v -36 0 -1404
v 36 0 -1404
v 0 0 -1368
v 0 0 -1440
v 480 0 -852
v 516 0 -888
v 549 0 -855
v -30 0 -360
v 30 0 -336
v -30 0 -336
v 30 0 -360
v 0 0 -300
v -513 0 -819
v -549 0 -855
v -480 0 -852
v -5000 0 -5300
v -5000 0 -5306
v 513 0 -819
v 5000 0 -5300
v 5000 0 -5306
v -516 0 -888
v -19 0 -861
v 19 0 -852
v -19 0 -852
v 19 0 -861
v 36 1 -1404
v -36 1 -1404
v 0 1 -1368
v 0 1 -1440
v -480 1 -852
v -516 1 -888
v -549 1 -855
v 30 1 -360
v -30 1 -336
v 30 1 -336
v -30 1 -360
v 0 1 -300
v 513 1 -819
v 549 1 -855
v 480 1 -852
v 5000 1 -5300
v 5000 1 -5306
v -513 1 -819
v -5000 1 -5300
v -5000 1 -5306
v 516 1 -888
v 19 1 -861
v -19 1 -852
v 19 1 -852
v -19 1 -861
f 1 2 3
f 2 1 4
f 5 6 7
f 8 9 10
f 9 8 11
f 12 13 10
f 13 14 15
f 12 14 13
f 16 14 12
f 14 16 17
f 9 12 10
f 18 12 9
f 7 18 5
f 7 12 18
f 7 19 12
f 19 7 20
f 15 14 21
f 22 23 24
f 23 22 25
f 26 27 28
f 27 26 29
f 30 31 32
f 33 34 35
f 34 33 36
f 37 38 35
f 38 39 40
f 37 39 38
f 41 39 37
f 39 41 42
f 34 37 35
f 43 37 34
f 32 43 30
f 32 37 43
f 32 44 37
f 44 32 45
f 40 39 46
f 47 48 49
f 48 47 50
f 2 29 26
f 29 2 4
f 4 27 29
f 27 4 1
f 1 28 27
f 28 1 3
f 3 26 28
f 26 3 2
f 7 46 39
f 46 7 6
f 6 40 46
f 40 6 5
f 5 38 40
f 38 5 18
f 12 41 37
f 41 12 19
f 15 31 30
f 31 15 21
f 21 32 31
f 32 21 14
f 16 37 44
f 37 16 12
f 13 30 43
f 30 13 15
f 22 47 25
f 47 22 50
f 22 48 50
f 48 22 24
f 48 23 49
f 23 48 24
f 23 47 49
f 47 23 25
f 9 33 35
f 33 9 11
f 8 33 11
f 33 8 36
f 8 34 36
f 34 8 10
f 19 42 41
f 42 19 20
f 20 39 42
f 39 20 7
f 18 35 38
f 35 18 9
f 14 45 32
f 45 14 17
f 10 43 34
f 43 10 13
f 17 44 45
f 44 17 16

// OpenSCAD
$fs = 120;

$vpt = [0,1080,480];
$vpr = [-34,0,0];
$vpf = 45;

foul_line = 6;
plain_color = [1,1,1,0.8];
out_color = [1,0.75,0.75,0.8];
eat_color = [0.5,0.75,1,0.8];

// home, first, second, third, rubber
color([1,1,1]) scale([1,-1,-1]) rotate([90,0,0]) linear_extrude(1) {
    polygon([[-30,30*2+300],[30,30*2+300],[30,30+300],[0,300],[-30,30+300]]);
    polygon([[552-36*2,852],[552-36,852+36],[552,852],[552-36,852-36]]);
    polygon([[0,1404+36],[36,1404],[0,1404-36],[-36,1404]]);
    polygon([[-552+36*2,852],[-552+36,852+36],[-552,852],[-552+36,852-36]]);
    polygon([[-19,852],[19,852],[19,9+852],[-19,9+852]]);
}

// foul lines
color([1,1,1,0.5]) scale([1,-1,-1]) rotate([90,0,0]) linear_extrude(1) {
    polygon([[0,300],[-5000,300+5000],[-5000,300+5000+foul_line],[0,300+foul_line]]);
    polygon([[0,300],[5000,300+5000],[5000,300+5000+foul_line],[0,300+foul_line]]);
}

scale([0.1,0.1,-0.1]) translate([-23200,0,0]) {
    color(out_color) polyhedron([[12420,0,13940],[12430,0,13940],[12420,1200,13940],[12430,1200,13940]], [[0,1,3,2]]);
    color(out_color) polyhedron([[12420,0,13940],[12380,0,21720],[12420,1200,13940],[12380,1200,21720]], [[0,1,3,2]]);
    color(out_color) polyhedron([[12430,0,13940],[12390,0,21720],[12430,1200,13940],[12390,1200,21720]], [[0,1,3,2]]);
    color(out_color) polyhedron([[12380,0,21720],[12390,0,21720],[12380,1200,21720],[12390,1200,21720]], [[0,1,3,2]]);
    color(out_color) polyhedron([[12420,1200,13940],[12380,1200,21720],[12430,1200,13940],[12390,1200,21720]], [[0,1,3,2]]);
    color(out_color) polyhedron([[12380,0,21720],[17180,0,26340],[12380,1200,21720],[17180,1200,26340]], [[0,1,3,2]]);
    color(out_color) polyhedron([[12380,0,21720],[12380,0,21820],[12380,1200,21720],[12380,1200,21820]], [[0,1,3,2]]);
    color(out_color) polyhedron([[17180,0,26340],[17180,0,26440],[17180,1200,26340],[17180,1200,26440]], [[0,1,3,2]]);
    color(out_color) polyhedron([[12380,0,21820],[17180,0,26440],[12380,1200,21820],[17180,1200,26440]], [[0,1,3,2]]);
    color(out_color) polyhedron([[12380,1200,21720],[12380,1200,21820],[17180,1200,26340],[17180,1200,26440]], [[0,1,3,2]]);
    color(out_color) polyhedron([[17180,0,26340],[20150,0,26340],[17180,1200,26340],[20150,1200,26340]], [[0,1,3,2]]);
    color(out_color) polyhedron([[17180,0,26340],[17180,0,26440],[17180,1200,26340],[17180,1200,26440]], [[0,1,3,2]]);
    color(out_color) polyhedron([[20150,0,26340],[20150,0,26440],[20150,1200,26340],[20150,1200,26440]], [[0,1,3,2]]);
    color(out_color) polyhedron([[17180,0,26440],[20150,0,26440],[17180,1200,26440],[20150,1200,26440]], [[0,1,3,2]]);
    color(out_color) polyhedron([[17180,1200,26340],[17180,1200,26440],[20150,1200,26340],[20150,1200,26440]], [[0,1,3,2]]);
    color(plain_color) polyhedron([[20150,0,26340],[26250,0,26340],[20150,1200,26340],[26250,1200,26340]], [[0,1,3,2]]);
    color(plain_color) polyhedron([[20150,0,26340],[20150,0,26440],[20150,1200,26340],[20150,1250,26440]], [[0,1,3,2]]);
    color(plain_color) polyhedron([[26250,0,26340],[26250,0,26440],[26250,1200,26340],[26250,1250,26440]], [[0,1,3,2]]);
    color(plain_color) polyhedron([[20150,0,26440],[26250,0,26440],[20150,1250,26440],[26250,1250,26440]], [[0,1,3,2]]);
    color(plain_color) polyhedron([[20150,1200,26340],[20150,1250,26440],[26250,1200,26340],[26250,1250,26440]], [[0,1,3,2]]);
    color(out_color) polyhedron([[26250,0,26340],[29220,0,26340],[26250,1200,26340],[29220,1200,26340]], [[0,1,3,2]]);
    color(out_color) polyhedron([[26250,0,26340],[26250,0,26440],[26250,1200,26340],[26250,1200,26440]], [[0,1,3,2]]);
    color(out_color) polyhedron([[29220,0,26340],[29220,0,26440],[29220,1200,26340],[29220,1200,26440]], [[0,1,3,2]]);
    color(out_color) polyhedron([[26250,0,26440],[29220,0,26440],[26250,1200,26440],[29220,1200,26440]], [[0,1,3,2]]);
    color(out_color) polyhedron([[26250,1200,26340],[26250,1200,26440],[29220,1200,26340],[29220,1200,26440]], [[0,1,3,2]]);
    color(out_color) polyhedron([[29220,0,26340],[34020,0,21720],[29220,1200,26340],[34020,1200,21720]], [[0,1,3,2]]);
    color(out_color) polyhedron([[29220,0,26340],[29220,0,26440],[29220,1200,26340],[29220,1200,26440]], [[0,1,3,2]]);
    color(out_color) polyhedron([[34020,0,21720],[34020,0,21820],[34020,1200,21720],[34020,1200,21820]], [[0,1,3,2]]);
    color(out_color) polyhedron([[29220,0,26440],[34020,0,21820],[29220,1200,26440],[34020,1200,21820]], [[0,1,3,2]]);
    color(out_color) polyhedron([[29220,1200,26340],[29220,1200,26440],[34020,1200,21720],[34020,1200,21820]], [[0,1,3,2]]);
    color(out_color) polyhedron([[33980,0,13900],[33990,0,13900],[33980,1200,13900],[33990,1200,13900]], [[0,1,3,2]]);
    color(out_color) polyhedron([[33980,0,13900],[34020,0,21720],[33980,1200,13900],[34020,1200,21720]], [[0,1,3,2]]);
    color(out_color) polyhedron([[33990,0,13900],[34030,0,21720],[33990,1200,13900],[34030,1200,21720]], [[0,1,3,2]]);
    color(out_color) polyhedron([[34020,0,21720],[34030,0,21720],[34020,1200,21720],[34030,1200,21720]], [[0,1,3,2]]);
    color(out_color) polyhedron([[33980,1200,13900],[34020,1200,21720],[33990,1200,13900],[34030,1200,21720]], [[0,1,3,2]]);
    color(out_color) polyhedron([[20150,0,26360],[26250,0,26360],[20150,3700,26360],[26250,3700,26360]], [[0,1,3,2]]);
    color(out_color) polyhedron([[20150,0,26360],[20150,0,26460],[20150,3700,26360],[20150,3700,26460]], [[0,1,3,2]]);
    color(out_color) polyhedron([[26250,0,26360],[26250,0,26460],[26250,3700,26360],[26250,3700,26460]], [[0,1,3,2]]);
    color(out_color) polyhedron([[20150,0,26460],[26250,0,26460],[20150,3700,26460],[26250,3700,26460]], [[0,1,3,2]]);
    color(out_color) polyhedron([[20150,3700,26360],[20150,3700,26460],[26250,3700,26360],[26250,3700,26460]], [[0,1,3,2]]);
    color(out_color) polyhedron([[2900,0,13940],[12430,0,13940],[2900,5,13940],[12430,5,13940]], [[0,1,3,2]]);
    color(out_color) polyhedron([[2900,0,13940],[2900,0,13950],[2900,5,13940],[2900,5,13950]], [[0,1,3,2]]);
    color(out_color) polyhedron([[12430,0,13940],[12430,0,13950],[12430,5,13940],[12430,5,13950]], [[0,1,3,2]]);
    color(out_color) polyhedron([[2900,0,13950],[12430,0,13950],[2900,5,13950],[12430,5,13950]], [[0,1,3,2]]);
    color(out_color) polyhedron([[2900,5,13940],[2900,5,13950],[12430,5,13940],[12430,5,13950]], [[0,1,3,2]]);
    color(out_color) polyhedron([[34030,0,13900],[40000,0,13900],[34030,5,13900],[40000,5,13900]], [[0,1,3,2]]);
    color(out_color) polyhedron([[34030,0,13900],[34030,0,13910],[34030,5,13900],[34030,5,13910]], [[0,1,3,2]]);
    color(out_color) polyhedron([[40000,0,13900],[40000,0,13910],[40000,5,13900],[40000,5,13910]], [[0,1,3,2]]);
    color(out_color) polyhedron([[34030,0,13910],[40000,0,13910],[34030,5,13910],[40000,5,13910]], [[0,1,3,2]]);
    color(out_color) polyhedron([[34030,5,13900],[34030,5,13910],[40000,5,13900],[40000,5,13910]], [[0,1,3,2]]);
    color(out_color) polyhedron([[13960,0,4590],[18500,0,4590],[13960,5,4590],[18500,5,4590]], [[0,1,3,2]]);
    color(out_color) polyhedron([[13960,0,4590],[13960,0,4690],[13960,5,4590],[13960,5,4690]], [[0,1,3,2]]);
    color(out_color) polyhedron([[18500,0,4590],[18500,0,4690],[18500,5,4590],[18500,5,4690]], [[0,1,3,2]]);
    color(out_color) polyhedron([[13960,0,4690],[18500,0,4690],[13960,5,4690],[18500,5,4690]], [[0,1,3,2]]);
    color(out_color) polyhedron([[13960,5,4590],[13960,5,4690],[18500,5,4590],[18500,5,4690]], [[0,1,3,2]]);
    color(out_color) polyhedron([[19090,0,1880],[19190,0,1880],[19090,5,1880],[19190,5,1880]], [[0,1,3,2]]);
    color(out_color) polyhedron([[19090,0,1880],[18500,0,4560],[19090,5,1880],[18500,5,4560]], [[0,1,3,2]]);
    color(out_color) polyhedron([[19190,0,1880],[18600,0,4560],[19190,5,1880],[18600,5,4560]], [[0,1,3,2]]);
    color(out_color) polyhedron([[18500,0,4560],[18600,0,4560],[18500,5,4560],[18600,5,4560]], [[0,1,3,2]]);
    color(out_color) polyhedron([[19090,5,1880],[18500,5,4560],[19190,5,1880],[18600,5,4560]], [[0,1,3,2]]);
    color(out_color) polyhedron([[2900,0,7210],[14730,0,7120],[2900,5,7210],[14730,5,7120]], [[0,1,3,2]]);
    color(out_color) polyhedron([[2900,0,7210],[2900,0,7220],[2900,5,7210],[2900,5,7220]], [[0,1,3,2]]);
    color(out_color) polyhedron([[14730,0,7120],[14730,0,7130],[14730,5,7120],[14730,5,7130]], [[0,1,3,2]]);
    color(out_color) polyhedron([[2900,0,7220],[14730,0,7130],[2900,5,7220],[14730,5,7130]], [[0,1,3,2]]);
    color(out_color) polyhedron([[2900,5,7210],[2900,5,7220],[14730,5,7120],[14730,5,7130]], [[0,1,3,2]]);
    color(out_color) polyhedron([[14730,0,7120],[16970,0,4490],[14730,5,7120],[16970,5,4490]], [[0,1,3,2]]);
    color(out_color) polyhedron([[14730,0,7120],[14730,0,7130],[14730,5,7120],[14730,5,7130]], [[0,1,3,2]]);
    color(out_color) polyhedron([[16970,0,4490],[16970,0,4500],[16970,5,4490],[16970,5,4500]], [[0,1,3,2]]);
    color(out_color) polyhedron([[14730,0,7130],[16970,0,4500],[14730,5,7130],[16970,5,4500]], [[0,1,3,2]]);
    color(out_color) polyhedron([[14730,5,7120],[14730,5,7130],[16970,5,4490],[16970,5,4500]], [[0,1,3,2]]);
    color(out_color) polyhedron([[26350,0,1910],[40000,0,15560],[26350,5,1910],[40000,5,15560]], [[0,1,3,2]]);
    color(out_color) polyhedron([[26350,0,1910],[26350,0,1920],[26350,5,1910],[26350,5,1920]], [[0,1,3,2]]);
    color(out_color) polyhedron([[40000,0,15560],[40000,0,15570],[40000,5,15560],[40000,5,15570]], [[0,1,3,2]]);
    color(out_color) polyhedron([[26350,0,1920],[40000,0,15570],[26350,5,1920],[40000,5,15570]], [[0,1,3,2]]);
    color(out_color) polyhedron([[26350,5,1910],[26350,5,1920],[40000,5,15560],[40000,5,15570]], [[0,1,3,2]]);
    color(plain_color) polyhedron([[0,0,0],[0,0,0],[0,0,0],[0,0,0]], [[0,1,3,2]]);
    color(plain_color) polyhedron([[0,0,0],[0,0,0],[0,0,0],[0,0,0]], [[0,1,3,2]]);
    color(plain_color) polyhedron([[0,0,0],[0,0,0],[0,0,0],[0,0,0]], [[0,1,3,2]]);
    color(plain_color) polyhedron([[0,0,0],[0,0,0],[0,0,0],[0,0,0]], [[0,1,3,2]]);
    color(plain_color) polyhedron([[0,0,0],[0,0,0],[0,0,0],[0,0,0]], [[0,1,3,2]]);
    color(plain_color) polyhedron([[0,0,0],[0,0,0],[0,0,0],[0,0,0]], [[0,1,3,2]]);
    color(plain_color) polyhedron([[0,0,0],[0,0,0],[0,0,0],[0,0,0]], [[0,1,3,2]]);
    color(plain_color) polyhedron([[0,0,0],[0,0,0],[0,0,0],[0,0,0]], [[0,1,3,2]]);
    color(plain_color) polyhedron([[0,0,0],[0,0,0],[0,0,0],[0,0,0]], [[0,1,3,2]]);
    color(plain_color) polyhedron([[0,0,0],[0,0,0],[0,0,0],[0,0,0]], [[0,1,3,2]]);
    color(plain_color) polyhedron([[0,0,0],[0,0,0],[0,0,0],[0,0,0]], [[0,1,3,2]]);
    color(plain_color) polyhedron([[0,0,0],[0,0,0],[0,0,0],[0,0,0]], [[0,1,3,2]]);
    color(plain_color) polyhedron([[0,0,0],[0,0,0],[0,0,0],[0,0,0]], [[0,1,3,2]]);
    color(plain_color) polyhedron([[0,0,0],[0,0,0],[0,0,0],[0,0,0]], [[0,1,3,2]]);
    color(plain_color) polyhedron([[0,0,0],[0,0,0],[0,0,0],[0,0,0]], [[0,1,3,2]]);
    color(plain_color) polyhedron([[0,0,0],[0,0,0],[0,0,0],[0,0,0]], [[0,1,3,2]]);
    color(plain_color) polyhedron([[0,0,0],[0,0,0],[0,0,0],[0,0,0]], [[0,1,3,2]]);
    color(plain_color) polyhedron([[0,0,0],[0,0,0],[0,0,0],[0,0,0]], [[0,1,3,2]]);
    color(plain_color) polyhedron([[0,0,0],[0,0,0],[0,0,0],[0,0,0]], [[0,1,3,2]]);
    color(plain_color) polyhedron([[0,0,0],[0,0,0],[0,0,0],[0,0,0]], [[0,1,3,2]]);
    color(plain_color) polyhedron([[0,0,0],[0,0,0],[0,0,0],[0,0,0]], [[0,1,3,2]]);
    color(plain_color) polyhedron([[0,0,0],[0,0,0],[0,0,0],[0,0,0]], [[0,1,3,2]]);
    color(plain_color) polyhedron([[0,0,0],[0,0,0],[0,0,0],[0,0,0]], [[0,1,3,2]]);
    color(plain_color) polyhedron([[0,0,0],[0,0,0],[0,0,0],[0,0,0]], [[0,1,3,2]]);
    color(plain_color) polyhedron([[0,0,0],[0,0,0],[0,0,0],[0,0,0]], [[0,1,3,2]]);
    color(plain_color) polyhedron([[0,0,0],[0,0,0],[0,0,0],[0,0,0]], [[0,1,3,2]]);
    color(plain_color) polyhedron([[0,0,0],[0,0,0],[0,0,0],[0,0,0]], [[0,1,3,2]]);
    color(plain_color) polyhedron([[0,0,0],[0,0,0],[0,0,0],[0,0,0]], [[0,1,3,2]]);
    color(plain_color) polyhedron([[0,0,0],[0,0,0],[0,0,0],[0,0,0]], [[0,1,3,2]]);
    color(plain_color) polyhedron([[0,0,0],[0,0,0],[0,0,0],[0,0,0]], [[0,1,3,2]]);
    color(plain_color) polyhedron([[0,0,0],[0,0,0],[0,0,0],[0,0,0]], [[0,1,3,2]]);
    color(plain_color) polyhedron([[0,0,0],[0,0,0],[0,0,0],[0,0,0]], [[0,1,3,2]]);
    color(plain_color) polyhedron([[0,0,0],[0,0,0],[0,0,0],[0,0,0]], [[0,1,3,2]]);
    color(plain_color) polyhedron([[0,0,0],[0,0,0],[0,0,0],[0,0,0]], [[0,1,3,2]]);
    color(plain_color) polyhedron([[0,0,0],[0,0,0],[0,0,0],[0,0,0]], [[0,1,3,2]]);
    color(plain_color) polyhedron([[0,0,0],[0,0,0],[0,0,0],[0,0,0]], [[0,1,3,2]]);
    color(plain_color) polyhedron([[0,0,0],[0,0,0],[0,0,0],[0,0,0]], [[0,1,3,2]]);
    color(plain_color) polyhedron([[0,0,0],[0,0,0],[0,0,0],[0,0,0]], [[0,1,3,2]]);
    color(plain_color) polyhedron([[0,0,0],[0,0,0],[0,0,0],[0,0,0]], [[0,1,3,2]]);
    color(plain_color) polyhedron([[0,0,0],[0,0,0],[0,0,0],[0,0,0]], [[0,1,3,2]]);
    color(plain_color) polyhedron([[0,0,0],[0,0,0],[0,0,0],[0,0,0]], [[0,1,3,2]]);
    color(plain_color) polyhedron([[0,0,0],[0,0,0],[0,0,0],[0,0,0]], [[0,1,3,2]]);
    color(plain_color) polyhedron([[0,0,0],[0,0,0],[0,0,0],[0,0,0]], [[0,1,3,2]]);
    color(plain_color) polyhedron([[0,0,0],[0,0,0],[0,0,0],[0,0,0]], [[0,1,3,2]]);
    color(plain_color) polyhedron([[0,0,0],[0,0,0],[0,0,0],[0,0,0]], [[0,1,3,2]]);
    color(plain_color) polyhedron([[0,0,0],[0,0,0],[0,0,0],[0,0,0]], [[0,1,3,2]]);
    color(plain_color) polyhedron([[0,0,0],[0,0,0],[0,0,0],[0,0,0]], [[0,1,3,2]]);
    color(plain_color) polyhedron([[0,0,0],[0,0,0],[0,0,0],[0,0,0]], [[0,1,3,2]]);
    color(plain_color) polyhedron([[0,0,0],[0,0,0],[0,0,0],[0,0,0]], [[0,1,3,2]]);
    color(plain_color) polyhedron([[0,0,0],[0,0,0],[0,0,0],[0,0,0]], [[0,1,3,2]]);
    color(plain_color) polyhedron([[0,0,0],[0,0,0],[0,0,0],[0,0,0]], [[0,1,3,2]]);
    color(plain_color) polyhedron([[0,0,0],[0,0,0],[0,0,0],[0,0,0]], [[0,1,3,2]]);
    color(plain_color) polyhedron([[0,0,0],[0,0,0],[0,0,0],[0,0,0]], [[0,1,3,2]]);
    color(plain_color) polyhedron([[0,0,0],[0,0,0],[0,0,0],[0,0,0]], [[0,1,3,2]]);
    color(plain_color) polyhedron([[0,0,0],[0,0,0],[0,0,0],[0,0,0]], [[0,1,3,2]]);
    color(plain_color) polyhedron([[0,0,0],[0,0,0],[0,0,0],[0,0,0]], [[0,1,3,2]]);
    color(plain_color) polyhedron([[0,0,0],[0,0,0],[0,0,0],[0,0,0]], [[0,1,3,2]]);
    color(plain_color) polyhedron([[0,0,0],[0,0,0],[0,0,0],[0,0,0]], [[0,1,3,2]]);
    color(plain_color) polyhedron([[0,0,0],[0,0,0],[0,0,0],[0,0,0]], [[0,1,3,2]]);
    color(plain_color) polyhedron([[0,0,0],[0,0,0],[0,0,0],[0,0,0]], [[0,1,3,2]]);
    color(plain_color) polyhedron([[0,0,0],[0,0,0],[0,0,0],[0,0,0]], [[0,1,3,2]]);
    color(plain_color) polyhedron([[0,0,0],[0,0,0],[0,0,0],[0,0,0]], [[0,1,3,2]]);
    color(plain_color) polyhedron([[0,0,0],[0,0,0],[0,0,0],[0,0,0]], [[0,1,3,2]]);
    color(plain_color) polyhedron([[0,0,0],[0,0,0],[0,0,0],[0,0,0]], [[0,1,3,2]]);
    color(plain_color) polyhedron([[0,0,0],[0,0,0],[0,0,0],[0,0,0]], [[0,1,3,2]]);
    color(plain_color) polyhedron([[0,0,0],[0,0,0],[0,0,0],[0,0,0]], [[0,1,3,2]]);
    color(plain_color) polyhedron([[0,0,0],[0,0,0],[0,0,0],[0,0,0]], [[0,1,3,2]]);
    color(plain_color) polyhedron([[0,0,0],[0,0,0],[0,0,0],[0,0,0]], [[0,1,3,2]]);
    color(plain_color) polyhedron([[0,0,0],[0,0,0],[0,0,0],[0,0,0]], [[0,1,3,2]]);
    color(plain_color) polyhedron([[0,0,0],[0,0,0],[0,0,0],[0,0,0]], [[0,1,3,2]]);
    color(plain_color) polyhedron([[0,0,0],[0,0,0],[0,0,0],[0,0,0]], [[0,1,3,2]]);
    color(plain_color) polyhedron([[0,0,0],[0,0,0],[0,0,0],[0,0,0]], [[0,1,3,2]]);
    color(plain_color) polyhedron([[0,0,0],[0,0,0],[0,0,0],[0,0,0]], [[0,1,3,2]]);
    color(plain_color) polyhedron([[0,0,0],[0,0,0],[0,0,0],[0,0,0]], [[0,1,3,2]]);
    color(plain_color) polyhedron([[0,0,0],[0,0,0],[0,0,0],[0,0,0]], [[0,1,3,2]]);
    color(plain_color) polyhedron([[0,0,0],[0,0,0],[0,0,0],[0,0,0]], [[0,1,3,2]]);
    color(plain_color) polyhedron([[0,0,0],[0,0,0],[0,0,0],[0,0,0]], [[0,1,3,2]]);
    color(plain_color) polyhedron([[0,0,0],[0,0,0],[0,0,0],[0,0,0]], [[0,1,3,2]]);
    color(plain_color) polyhedron([[0,0,0],[0,0,0],[0,0,0],[0,0,0]], [[0,1,3,2]]);
    color(plain_color) polyhedron([[0,0,0],[0,0,0],[0,0,0],[0,0,0]], [[0,1,3,2]]);
    color(plain_color) polyhedron([[0,0,0],[0,0,0],[0,0,0],[0,0,0]], [[0,1,3,2]]);
    color(plain_color) polyhedron([[0,0,0],[0,0,0],[0,0,0],[0,0,0]], [[0,1,3,2]]);
    color(plain_color) polyhedron([[0,0,0],[0,0,0],[0,0,0],[0,0,0]], [[0,1,3,2]]);
    color(plain_color) polyhedron([[0,0,0],[0,0,0],[0,0,0],[0,0,0]], [[0,1,3,2]]);
    color(plain_color) polyhedron([[0,0,0],[0,0,0],[0,0,0],[0,0,0]], [[0,1,3,2]]);
    color(plain_color) polyhedron([[0,0,0],[0,0,0],[0,0,0],[0,0,0]], [[0,1,3,2]]);
    color(plain_color) polyhedron([[0,0,0],[0,0,0],[0,0,0],[0,0,0]], [[0,1,3,2]]);
    color(plain_color) polyhedron([[0,0,0],[0,0,0],[0,0,0],[0,0,0]], [[0,1,3,2]]);
    color(plain_color) polyhedron([[0,0,0],[0,0,0],[0,0,0],[0,0,0]], [[0,1,3,2]]);
    color(plain_color) polyhedron([[0,0,0],[0,0,0],[0,0,0],[0,0,0]], [[0,1,3,2]]);
    color(plain_color) polyhedron([[0,0,0],[0,0,0],[0,0,0],[0,0,0]], [[0,1,3,2]]);
    color(plain_color) polyhedron([[0,0,0],[0,0,0],[0,0,0],[0,0,0]], [[0,1,3,2]]);
    color(plain_color) polyhedron([[0,0,0],[0,0,0],[0,0,0],[0,0,0]], [[0,1,3,2]]);
    color(plain_color) polyhedron([[0,0,0],[0,0,0],[0,0,0],[0,0,0]], [[0,1,3,2]]);
    color(plain_color) polyhedron([[0,0,0],[0,0,0],[0,0,0],[0,0,0]], [[0,1,3,2]]);
    color(plain_color) polyhedron([[0,0,0],[0,0,0],[0,0,0],[0,0,0]], [[0,1,3,2]]);
    color(plain_color) polyhedron([[0,0,0],[0,0,0],[0,0,0],[0,0,0]], [[0,1,3,2]]);
    color(plain_color) polyhedron([[0,0,0],[0,0,0],[0,0,0],[0,0,0]], [[0,1,3,2]]);
    color(plain_color) polyhedron([[0,0,0],[0,0,0],[0,0,0],[0,0,0]], [[0,1,3,2]]);
    color(plain_color) polyhedron([[0,0,0],[0,0,0],[0,0,0],[0,0,0]], [[0,1,3,2]]);
    color(plain_color) polyhedron([[0,0,0],[0,0,0],[0,0,0],[0,0,0]], [[0,1,3,2]]);
    color(plain_color) polyhedron([[0,0,0],[0,0,0],[0,0,0],[0,0,0]], [[0,1,3,2]]);
    color(plain_color) polyhedron([[0,0,0],[0,0,0],[0,0,0],[0,0,0]], [[0,1,3,2]]);
    color(plain_color) polyhedron([[0,0,0],[0,0,0],[0,0,0],[0,0,0]], [[0,1,3,2]]);
    color(plain_color) polyhedron([[0,0,0],[0,0,0],[0,0,0],[0,0,0]], [[0,1,3,2]]);
    color(plain_color) polyhedron([[0,0,0],[0,0,0],[0,0,0],[0,0,0]], [[0,1,3,2]]);
    color(plain_color) polyhedron([[0,0,0],[0,0,0],[0,0,0],[0,0,0]], [[0,1,3,2]]);
    color(plain_color) polyhedron([[0,0,0],[0,0,0],[0,0,0],[0,0,0]], [[0,1,3,2]]);
    color(plain_color) polyhedron([[0,0,0],[0,0,0],[0,0,0],[0,0,0]], [[0,1,3,2]]);
    color(plain_color) polyhedron([[0,0,0],[0,0,0],[0,0,0],[0,0,0]], [[0,1,3,2]]);
    color(plain_color) polyhedron([[0,0,0],[0,0,0],[0,0,0],[0,0,0]], [[0,1,3,2]]);
    color(plain_color) polyhedron([[0,0,0],[0,0,0],[0,0,0],[0,0,0]], [[0,1,3,2]]);
    color(plain_color) polyhedron([[0,0,0],[0,0,0],[0,0,0],[0,0,0]], [[0,1,3,2]]);
    color(plain_color) polyhedron([[0,0,0],[0,0,0],[0,0,0],[0,0,0]], [[0,1,3,2]]);
    color(plain_color) polyhedron([[0,0,0],[0,0,0],[0,0,0],[0,0,0]], [[0,1,3,2]]);
    color(plain_color) polyhedron([[0,0,0],[0,0,0],[0,0,0],[0,0,0]], [[0,1,3,2]]);
    color(plain_color) polyhedron([[0,0,0],[0,0,0],[0,0,0],[0,0,0]], [[0,1,3,2]]);
    color(plain_color) polyhedron([[0,0,0],[0,0,0],[0,0,0],[0,0,0]], [[0,1,3,2]]);
    color(plain_color) polyhedron([[0,0,0],[0,0,0],[0,0,0],[0,0,0]], [[0,1,3,2]]);
    color(plain_color) polyhedron([[0,0,0],[0,0,0],[0,0,0],[0,0,0]], [[0,1,3,2]]);
    color(plain_color) polyhedron([[0,0,0],[0,0,0],[0,0,0],[0,0,0]], [[0,1,3,2]]);
    color(plain_color) polyhedron([[0,0,0],[0,0,0],[0,0,0],[0,0,0]], [[0,1,3,2]]);
    color(plain_color) polyhedron([[0,0,0],[0,0,0],[0,0,0],[0,0,0]], [[0,1,3,2]]);
    color(plain_color) polyhedron([[0,0,0],[0,0,0],[0,0,0],[0,0,0]], [[0,1,3,2]]);
    color(plain_color) polyhedron([[0,0,0],[0,0,0],[0,0,0],[0,0,0]], [[0,1,3,2]]);
    color(plain_color) polyhedron([[0,0,0],[0,0,0],[0,0,0],[0,0,0]], [[0,1,3,2]]);
    color(plain_color) polyhedron([[0,0,0],[0,0,0],[0,0,0],[0,0,0]], [[0,1,3,2]]);
    color(plain_color) polyhedron([[0,0,0],[0,0,0],[0,0,0],[0,0,0]], [[0,1,3,2]]);
    color(plain_color) polyhedron([[0,0,0],[0,0,0],[0,0,0],[0,0,0]], [[0,1,3,2]]);
    color(plain_color) polyhedron([[0,0,0],[0,0,0],[0,0,0],[0,0,0]], [[0,1,3,2]]);
    color(plain_color) polyhedron([[0,0,0],[0,0,0],[0,0,0],[0,0,0]], [[0,1,3,2]]);
    color(plain_color) polyhedron([[0,0,0],[0,0,0],[0,0,0],[0,0,0]], [[0,1,3,2]]);
    color(plain_color) polyhedron([[0,0,0],[0,0,0],[0,0,0],[0,0,0]], [[0,1,3,2]]);
    color(plain_color) polyhedron([[0,0,0],[0,0,0],[0,0,0],[0,0,0]], [[0,1,3,2]]);
    color(plain_color) polyhedron([[0,0,0],[0,0,0],[0,0,0],[0,0,0]], [[0,1,3,2]]);
    color(plain_color) polyhedron([[0,0,0],[0,0,0],[0,0,0],[0,0,0]], [[0,1,3,2]]);
    color(plain_color) polyhedron([[0,0,0],[0,0,0],[0,0,0],[0,0,0]], [[0,1,3,2]]);
    color(plain_color) polyhedron([[0,0,0],[0,0,0],[0,0,0],[0,0,0]], [[0,1,3,2]]);
    color(plain_color) polyhedron([[0,0,0],[0,0,0],[0,0,0],[0,0,0]], [[0,1,3,2]]);
    color(plain_color) polyhedron([[0,0,0],[0,0,0],[0,0,0],[0,0,0]], [[0,1,3,2]]);
    color(plain_color) polyhedron([[0,0,0],[0,0,0],[0,0,0],[0,0,0]], [[0,1,3,2]]);
    color(plain_color) polyhedron([[0,0,0],[0,0,0],[0,0,0],[0,0,0]], [[0,1,3,2]]);
    color(plain_color) polyhedron([[0,0,0],[0,0,0],[0,0,0],[0,0,0]], [[0,1,3,2]]);
    color(plain_color) polyhedron([[0,0,0],[0,0,0],[0,0,0],[0,0,0]], [[0,1,3,2]]);
    color(plain_color) polyhedron([[0,0,0],[0,0,0],[0,0,0],[0,0,0]], [[0,1,3,2]]);
    color(plain_color) polyhedron([[0,0,0],[0,0,0],[0,0,0],[0,0,0]], [[0,1,3,2]]);
    color(plain_color) polyhedron([[0,0,0],[0,0,0],[0,0,0],[0,0,0]], [[0,1,3,2]]);
    color(plain_color) polyhedron([[0,0,0],[0,0,0],[0,0,0],[0,0,0]], [[0,1,3,2]]);
    color(plain_color) polyhedron([[0,0,0],[0,0,0],[0,0,0],[0,0,0]], [[0,1,3,2]]);
    color(plain_color) polyhedron([[0,0,0],[0,0,0],[0,0,0],[0,0,0]], [[0,1,3,2]]);
    color(plain_color) polyhedron([[0,0,0],[0,0,0],[0,0,0],[0,0,0]], [[0,1,3,2]]);
    color(plain_color) polyhedron([[0,0,0],[0,0,0],[0,0,0],[0,0,0]], [[0,1,3,2]]);
    color(plain_color) polyhedron([[0,0,0],[0,0,0],[0,0,0],[0,0,0]], [[0,1,3,2]]);
    color(plain_color) polyhedron([[0,0,0],[0,0,0],[0,0,0],[0,0,0]], [[0,1,3,2]]);
    color(plain_color) polyhedron([[0,0,0],[0,0,0],[0,0,0],[0,0,0]], [[0,1,3,2]]);
    color(plain_color) polyhedron([[0,0,0],[0,0,0],[0,0,0],[0,0,0]], [[0,1,3,2]]);
    color(plain_color) polyhedron([[0,0,0],[0,0,0],[0,0,0],[0,0,0]], [[0,1,3,2]]);
    color(plain_color) polyhedron([[0,0,0],[0,0,0],[0,0,0],[0,0,0]], [[0,1,3,2]]);
    color(plain_color) polyhedron([[0,0,0],[0,0,0],[0,0,0],[0,0,0]], [[0,1,3,2]]);
    color(plain_color) polyhedron([[0,0,0],[0,0,0],[0,0,0],[0,0,0]], [[0,1,3,2]]);
    color(plain_color) polyhedron([[0,0,0],[0,0,0],[0,0,0],[0,0,0]], [[0,1,3,2]]);
    color(plain_color) polyhedron([[0,0,0],[0,0,0],[0,0,0],[0,0,0]], [[0,1,3,2]]);
    color(plain_color) polyhedron([[0,0,0],[0,0,0],[0,0,0],[0,0,0]], [[0,1,3,2]]);
    color(plain_color) polyhedron([[0,0,0],[0,0,0],[0,0,0],[0,0,0]], [[0,1,3,2]]);
    color(plain_color) polyhedron([[0,0,0],[0,0,0],[0,0,0],[0,0,0]], [[0,1,3,2]]);
    color(plain_color) polyhedron([[0,0,0],[0,0,0],[0,0,0],[0,0,0]], [[0,1,3,2]]);
    color(plain_color) polyhedron([[0,0,0],[0,0,0],[0,0,0],[0,0,0]], [[0,1,3,2]]);
    color(plain_color) polyhedron([[0,0,0],[0,0,0],[0,0,0],[0,0,0]], [[0,1,3,2]]);
    color(plain_color) polyhedron([[0,0,0],[0,0,0],[0,0,0],[0,0,0]], [[0,1,3,2]]);
    color(plain_color) polyhedron([[0,0,0],[0,0,0],[0,0,0],[0,0,0]], [[0,1,3,2]]);
    color(plain_color) polyhedron([[0,0,0],[0,0,0],[0,0,0],[0,0,0]], [[0,1,3,2]]);
    color(plain_color) polyhedron([[0,0,0],[0,0,0],[0,0,0],[0,0,0]], [[0,1,3,2]]);
    color(plain_color) polyhedron([[0,0,0],[0,0,0],[0,0,0],[0,0,0]], [[0,1,3,2]]);
    color(plain_color) polyhedron([[0,0,0],[0,0,0],[0,0,0],[0,0,0]], [[0,1,3,2]]);
    color(plain_color) polyhedron([[0,0,0],[0,0,0],[0,0,0],[0,0,0]], [[0,1,3,2]]);
    color(plain_color) polyhedron([[0,0,0],[0,0,0],[0,0,0],[0,0,0]], [[0,1,3,2]]);
    color(plain_color) polyhedron([[0,0,0],[0,0,0],[0,0,0],[0,0,0]], [[0,1,3,2]]);
    color(plain_color) polyhedron([[0,0,0],[0,0,0],[0,0,0],[0,0,0]], [[0,1,3,2]]);
    color(plain_color) polyhedron([[0,0,0],[0,0,0],[0,0,0],[0,0,0]], [[0,1,3,2]]);
    color(plain_color) polyhedron([[0,0,0],[0,0,0],[0,0,0],[0,0,0]], [[0,1,3,2]]);
    color(plain_color) polyhedron([[0,0,0],[0,0,0],[0,0,0],[0,0,0]], [[0,1,3,2]]);
    color(plain_color) polyhedron([[0,0,0],[0,0,0],[0,0,0],[0,0,0]], [[0,1,3,2]]);
    color(plain_color) polyhedron([[0,0,0],[0,0,0],[0,0,0],[0,0,0]], [[0,1,3,2]]);
    color(plain_color) polyhedron([[0,0,0],[0,0,0],[0,0,0],[0,0,0]], [[0,1,3,2]]);
    color(plain_color) polyhedron([[0,0,0],[0,0,0],[0,0,0],[0,0,0]], [[0,1,3,2]]);
    color(plain_color) polyhedron([[0,0,0],[0,0,0],[0,0,0],[0,0,0]], [[0,1,3,2]]);
    color(plain_color) polyhedron([[0,0,0],[0,0,0],[0,0,0],[0,0,0]], [[0,1,3,2]]);
    color(plain_color) polyhedron([[0,0,0],[0,0,0],[0,0,0],[0,0,0]], [[0,1,3,2]]);
    color(plain_color) polyhedron([[0,0,0],[0,0,0],[0,0,0],[0,0,0]], [[0,1,3,2]]);
    color(plain_color) polyhedron([[0,0,0],[0,0,0],[0,0,0],[0,0,0]], [[0,1,3,2]]);
    color(plain_color) polyhedron([[0,0,0],[0,0,0],[0,0,0],[0,0,0]], [[0,1,3,2]]);
    color(plain_color) polyhedron([[0,0,0],[0,0,0],[0,0,0],[0,0,0]], [[0,1,3,2]]);
    color(plain_color) polyhedron([[0,0,0],[0,0,0],[0,0,0],[0,0,0]], [[0,1,3,2]]);
    color(plain_color) polyhedron([[0,0,0],[0,0,0],[0,0,0],[0,0,0]], [[0,1,3,2]]);
    color(plain_color) polyhedron([[0,0,0],[0,0,0],[0,0,0],[0,0,0]], [[0,1,3,2]]);
    color(plain_color) polyhedron([[0,0,0],[0,0,0],[0,0,0],[0,0,0]], [[0,1,3,2]]);
    color(plain_color) polyhedron([[0,0,0],[0,0,0],[0,0,0],[0,0,0]], [[0,1,3,2]]);
    color(plain_color) polyhedron([[0,0,0],[0,0,0],[0,0,0],[0,0,0]], [[0,1,3,2]]);
    color(plain_color) polyhedron([[0,0,0],[0,0,0],[0,0,0],[0,0,0]], [[0,1,3,2]]);
    color(plain_color) polyhedron([[0,0,0],[0,0,0],[0,0,0],[0,0,0]], [[0,1,3,2]]);
    color(plain_color) polyhedron([[0,0,0],[0,0,0],[0,0,0],[0,0,0]], [[0,1,3,2]]);
    color(plain_color) polyhedron([[0,0,0],[0,0,0],[0,0,0],[0,0,0]], [[0,1,3,2]]);
    color(plain_color) polyhedron([[0,0,0],[0,0,0],[0,0,0],[0,0,0]], [[0,1,3,2]]);
    color(plain_color) polyhedron([[0,0,0],[0,0,0],[0,0,0],[0,0,0]], [[0,1,3,2]]);
    color(plain_color) polyhedron([[0,0,0],[0,0,0],[0,0,0],[0,0,0]], [[0,1,3,2]]);
    color(plain_color) polyhedron([[0,0,0],[0,0,0],[0,0,0],[0,0,0]], [[0,1,3,2]]);
    color(plain_color) polyhedron([[0,0,0],[0,0,0],[0,0,0],[0,0,0]], [[0,1,3,2]]);
    color(plain_color) polyhedron([[0,0,0],[0,0,0],[0,0,0],[0,0,0]], [[0,1,3,2]]);
    color(plain_color) polyhedron([[0,0,0],[0,0,0],[0,0,0],[0,0,0]], [[0,1,3,2]]);
    color(plain_color) polyhedron([[0,0,0],[0,0,0],[0,0,0],[0,0,0]], [[0,1,3,2]]);
    color(plain_color) polyhedron([[0,0,0],[0,0,0],[0,0,0],[0,0,0]], [[0,1,3,2]]);
    color(plain_color) polyhedron([[0,0,0],[0,0,0],[0,0,0],[0,0,0]], [[0,1,3,2]]);
    color(plain_color) polyhedron([[0,0,0],[0,0,0],[0,0,0],[0,0,0]], [[0,1,3,2]]);
    color(plain_color) polyhedron([[0,0,0],[0,0,0],[0,0,0],[0,0,0]], [[0,1,3,2]]);
    color(plain_color) polyhedron([[0,0,0],[0,0,0],[0,0,0],[0,0,0]], [[0,1,3,2]]);
    color(plain_color) polyhedron([[0,0,0],[0,0,0],[0,0,0],[0,0,0]], [[0,1,3,2]]);
    color(plain_color) polyhedron([[0,0,0],[0,0,0],[0,0,0],[0,0,0]], [[0,1,3,2]]);
    color(plain_color) polyhedron([[0,0,0],[0,0,0],[0,0,0],[0,0,0]], [[0,1,3,2]]);
    color(plain_color) polyhedron([[0,0,0],[0,0,0],[0,0,0],[0,0,0]], [[0,1,3,2]]);
    color(plain_color) polyhedron([[0,0,0],[0,0,0],[0,0,0],[0,0,0]], [[0,1,3,2]]);
    color(plain_color) polyhedron([[0,0,0],[0,0,0],[0,0,0],[0,0,0]], [[0,1,3,2]]);
    color(plain_color) polyhedron([[0,0,0],[0,0,0],[0,0,0],[0,0,0]], [[0,1,3,2]]);
    color(plain_color) polyhedron([[0,0,0],[0,0,0],[0,0,0],[0,0,0]], [[0,1,3,2]]);
    color(plain_color) polyhedron([[0,0,0],[0,0,0],[0,0,0],[0,0,0]], [[0,1,3,2]]);
    color(plain_color) polyhedron([[0,0,0],[0,0,0],[0,0,0],[0,0,0]], [[0,1,3,2]]);
    color(plain_color) polyhedron([[0,0,0],[0,0,0],[0,0,0],[0,0,0]], [[0,1,3,2]]);
    color(plain_color) polyhedron([[0,0,0],[0,0,0],[0,0,0],[0,0,0]], [[0,1,3,2]]);
    color(plain_color) polyhedron([[0,0,0],[0,0,0],[0,0,0],[0,0,0]], [[0,1,3,2]]);
    color(plain_color) polyhedron([[0,0,0],[0,0,0],[0,0,0],[0,0,0]], [[0,1,3,2]]);
    color(plain_color) polyhedron([[0,0,0],[0,0,0],[0,0,0],[0,0,0]], [[0,1,3,2]]);
    color(plain_color) polyhedron([[0,0,0],[0,0,0],[0,0,0],[0,0,0]], [[0,1,3,2]]);
    color(plain_color) polyhedron([[0,0,0],[0,0,0],[0,0,0],[0,0,0]], [[0,1,3,2]]);
    color(plain_color) polyhedron([[0,0,0],[0,0,0],[0,0,0],[0,0,0]], [[0,1,3,2]]);
    color(plain_color) polyhedron([[0,0,0],[0,0,0],[0,0,0],[0,0,0]], [[0,1,3,2]]);
    color(plain_color) polyhedron([[0,0,0],[0,0,0],[0,0,0],[0,0,0]], [[0,1,3,2]]);
    color(plain_color) polyhedron([[0,0,0],[0,0,0],[0,0,0],[0,0,0]], [[0,1,3,2]]);
    color(plain_color) polyhedron([[0,0,0],[0,0,0],[0,0,0],[0,0,0]], [[0,1,3,2]]);
    color(plain_color) polyhedron([[0,0,0],[0,0,0],[0,0,0],[0,0,0]], [[0,1,3,2]]);
    color(plain_color) polyhedron([[0,0,0],[0,0,0],[0,0,0],[0,0,0]], [[0,1,3,2]]);
    color(plain_color) polyhedron([[0,0,0],[0,0,0],[0,0,0],[0,0,0]], [[0,1,3,2]]);
    color(plain_color) polyhedron([[0,0,0],[0,0,0],[0,0,0],[0,0,0]], [[0,1,3,2]]);
    color(plain_color) polyhedron([[0,0,0],[0,0,0],[0,0,0],[0,0,0]], [[0,1,3,2]]);
    color(plain_color) polyhedron([[0,0,0],[0,0,0],[0,0,0],[0,0,0]], [[0,1,3,2]]);
    color(plain_color) polyhedron([[0,0,0],[0,0,0],[0,0,0],[0,0,0]], [[0,1,3,2]]);
    color(plain_color) polyhedron([[0,0,0],[0,0,0],[0,0,0],[0,0,0]], [[0,1,3,2]]);
}
